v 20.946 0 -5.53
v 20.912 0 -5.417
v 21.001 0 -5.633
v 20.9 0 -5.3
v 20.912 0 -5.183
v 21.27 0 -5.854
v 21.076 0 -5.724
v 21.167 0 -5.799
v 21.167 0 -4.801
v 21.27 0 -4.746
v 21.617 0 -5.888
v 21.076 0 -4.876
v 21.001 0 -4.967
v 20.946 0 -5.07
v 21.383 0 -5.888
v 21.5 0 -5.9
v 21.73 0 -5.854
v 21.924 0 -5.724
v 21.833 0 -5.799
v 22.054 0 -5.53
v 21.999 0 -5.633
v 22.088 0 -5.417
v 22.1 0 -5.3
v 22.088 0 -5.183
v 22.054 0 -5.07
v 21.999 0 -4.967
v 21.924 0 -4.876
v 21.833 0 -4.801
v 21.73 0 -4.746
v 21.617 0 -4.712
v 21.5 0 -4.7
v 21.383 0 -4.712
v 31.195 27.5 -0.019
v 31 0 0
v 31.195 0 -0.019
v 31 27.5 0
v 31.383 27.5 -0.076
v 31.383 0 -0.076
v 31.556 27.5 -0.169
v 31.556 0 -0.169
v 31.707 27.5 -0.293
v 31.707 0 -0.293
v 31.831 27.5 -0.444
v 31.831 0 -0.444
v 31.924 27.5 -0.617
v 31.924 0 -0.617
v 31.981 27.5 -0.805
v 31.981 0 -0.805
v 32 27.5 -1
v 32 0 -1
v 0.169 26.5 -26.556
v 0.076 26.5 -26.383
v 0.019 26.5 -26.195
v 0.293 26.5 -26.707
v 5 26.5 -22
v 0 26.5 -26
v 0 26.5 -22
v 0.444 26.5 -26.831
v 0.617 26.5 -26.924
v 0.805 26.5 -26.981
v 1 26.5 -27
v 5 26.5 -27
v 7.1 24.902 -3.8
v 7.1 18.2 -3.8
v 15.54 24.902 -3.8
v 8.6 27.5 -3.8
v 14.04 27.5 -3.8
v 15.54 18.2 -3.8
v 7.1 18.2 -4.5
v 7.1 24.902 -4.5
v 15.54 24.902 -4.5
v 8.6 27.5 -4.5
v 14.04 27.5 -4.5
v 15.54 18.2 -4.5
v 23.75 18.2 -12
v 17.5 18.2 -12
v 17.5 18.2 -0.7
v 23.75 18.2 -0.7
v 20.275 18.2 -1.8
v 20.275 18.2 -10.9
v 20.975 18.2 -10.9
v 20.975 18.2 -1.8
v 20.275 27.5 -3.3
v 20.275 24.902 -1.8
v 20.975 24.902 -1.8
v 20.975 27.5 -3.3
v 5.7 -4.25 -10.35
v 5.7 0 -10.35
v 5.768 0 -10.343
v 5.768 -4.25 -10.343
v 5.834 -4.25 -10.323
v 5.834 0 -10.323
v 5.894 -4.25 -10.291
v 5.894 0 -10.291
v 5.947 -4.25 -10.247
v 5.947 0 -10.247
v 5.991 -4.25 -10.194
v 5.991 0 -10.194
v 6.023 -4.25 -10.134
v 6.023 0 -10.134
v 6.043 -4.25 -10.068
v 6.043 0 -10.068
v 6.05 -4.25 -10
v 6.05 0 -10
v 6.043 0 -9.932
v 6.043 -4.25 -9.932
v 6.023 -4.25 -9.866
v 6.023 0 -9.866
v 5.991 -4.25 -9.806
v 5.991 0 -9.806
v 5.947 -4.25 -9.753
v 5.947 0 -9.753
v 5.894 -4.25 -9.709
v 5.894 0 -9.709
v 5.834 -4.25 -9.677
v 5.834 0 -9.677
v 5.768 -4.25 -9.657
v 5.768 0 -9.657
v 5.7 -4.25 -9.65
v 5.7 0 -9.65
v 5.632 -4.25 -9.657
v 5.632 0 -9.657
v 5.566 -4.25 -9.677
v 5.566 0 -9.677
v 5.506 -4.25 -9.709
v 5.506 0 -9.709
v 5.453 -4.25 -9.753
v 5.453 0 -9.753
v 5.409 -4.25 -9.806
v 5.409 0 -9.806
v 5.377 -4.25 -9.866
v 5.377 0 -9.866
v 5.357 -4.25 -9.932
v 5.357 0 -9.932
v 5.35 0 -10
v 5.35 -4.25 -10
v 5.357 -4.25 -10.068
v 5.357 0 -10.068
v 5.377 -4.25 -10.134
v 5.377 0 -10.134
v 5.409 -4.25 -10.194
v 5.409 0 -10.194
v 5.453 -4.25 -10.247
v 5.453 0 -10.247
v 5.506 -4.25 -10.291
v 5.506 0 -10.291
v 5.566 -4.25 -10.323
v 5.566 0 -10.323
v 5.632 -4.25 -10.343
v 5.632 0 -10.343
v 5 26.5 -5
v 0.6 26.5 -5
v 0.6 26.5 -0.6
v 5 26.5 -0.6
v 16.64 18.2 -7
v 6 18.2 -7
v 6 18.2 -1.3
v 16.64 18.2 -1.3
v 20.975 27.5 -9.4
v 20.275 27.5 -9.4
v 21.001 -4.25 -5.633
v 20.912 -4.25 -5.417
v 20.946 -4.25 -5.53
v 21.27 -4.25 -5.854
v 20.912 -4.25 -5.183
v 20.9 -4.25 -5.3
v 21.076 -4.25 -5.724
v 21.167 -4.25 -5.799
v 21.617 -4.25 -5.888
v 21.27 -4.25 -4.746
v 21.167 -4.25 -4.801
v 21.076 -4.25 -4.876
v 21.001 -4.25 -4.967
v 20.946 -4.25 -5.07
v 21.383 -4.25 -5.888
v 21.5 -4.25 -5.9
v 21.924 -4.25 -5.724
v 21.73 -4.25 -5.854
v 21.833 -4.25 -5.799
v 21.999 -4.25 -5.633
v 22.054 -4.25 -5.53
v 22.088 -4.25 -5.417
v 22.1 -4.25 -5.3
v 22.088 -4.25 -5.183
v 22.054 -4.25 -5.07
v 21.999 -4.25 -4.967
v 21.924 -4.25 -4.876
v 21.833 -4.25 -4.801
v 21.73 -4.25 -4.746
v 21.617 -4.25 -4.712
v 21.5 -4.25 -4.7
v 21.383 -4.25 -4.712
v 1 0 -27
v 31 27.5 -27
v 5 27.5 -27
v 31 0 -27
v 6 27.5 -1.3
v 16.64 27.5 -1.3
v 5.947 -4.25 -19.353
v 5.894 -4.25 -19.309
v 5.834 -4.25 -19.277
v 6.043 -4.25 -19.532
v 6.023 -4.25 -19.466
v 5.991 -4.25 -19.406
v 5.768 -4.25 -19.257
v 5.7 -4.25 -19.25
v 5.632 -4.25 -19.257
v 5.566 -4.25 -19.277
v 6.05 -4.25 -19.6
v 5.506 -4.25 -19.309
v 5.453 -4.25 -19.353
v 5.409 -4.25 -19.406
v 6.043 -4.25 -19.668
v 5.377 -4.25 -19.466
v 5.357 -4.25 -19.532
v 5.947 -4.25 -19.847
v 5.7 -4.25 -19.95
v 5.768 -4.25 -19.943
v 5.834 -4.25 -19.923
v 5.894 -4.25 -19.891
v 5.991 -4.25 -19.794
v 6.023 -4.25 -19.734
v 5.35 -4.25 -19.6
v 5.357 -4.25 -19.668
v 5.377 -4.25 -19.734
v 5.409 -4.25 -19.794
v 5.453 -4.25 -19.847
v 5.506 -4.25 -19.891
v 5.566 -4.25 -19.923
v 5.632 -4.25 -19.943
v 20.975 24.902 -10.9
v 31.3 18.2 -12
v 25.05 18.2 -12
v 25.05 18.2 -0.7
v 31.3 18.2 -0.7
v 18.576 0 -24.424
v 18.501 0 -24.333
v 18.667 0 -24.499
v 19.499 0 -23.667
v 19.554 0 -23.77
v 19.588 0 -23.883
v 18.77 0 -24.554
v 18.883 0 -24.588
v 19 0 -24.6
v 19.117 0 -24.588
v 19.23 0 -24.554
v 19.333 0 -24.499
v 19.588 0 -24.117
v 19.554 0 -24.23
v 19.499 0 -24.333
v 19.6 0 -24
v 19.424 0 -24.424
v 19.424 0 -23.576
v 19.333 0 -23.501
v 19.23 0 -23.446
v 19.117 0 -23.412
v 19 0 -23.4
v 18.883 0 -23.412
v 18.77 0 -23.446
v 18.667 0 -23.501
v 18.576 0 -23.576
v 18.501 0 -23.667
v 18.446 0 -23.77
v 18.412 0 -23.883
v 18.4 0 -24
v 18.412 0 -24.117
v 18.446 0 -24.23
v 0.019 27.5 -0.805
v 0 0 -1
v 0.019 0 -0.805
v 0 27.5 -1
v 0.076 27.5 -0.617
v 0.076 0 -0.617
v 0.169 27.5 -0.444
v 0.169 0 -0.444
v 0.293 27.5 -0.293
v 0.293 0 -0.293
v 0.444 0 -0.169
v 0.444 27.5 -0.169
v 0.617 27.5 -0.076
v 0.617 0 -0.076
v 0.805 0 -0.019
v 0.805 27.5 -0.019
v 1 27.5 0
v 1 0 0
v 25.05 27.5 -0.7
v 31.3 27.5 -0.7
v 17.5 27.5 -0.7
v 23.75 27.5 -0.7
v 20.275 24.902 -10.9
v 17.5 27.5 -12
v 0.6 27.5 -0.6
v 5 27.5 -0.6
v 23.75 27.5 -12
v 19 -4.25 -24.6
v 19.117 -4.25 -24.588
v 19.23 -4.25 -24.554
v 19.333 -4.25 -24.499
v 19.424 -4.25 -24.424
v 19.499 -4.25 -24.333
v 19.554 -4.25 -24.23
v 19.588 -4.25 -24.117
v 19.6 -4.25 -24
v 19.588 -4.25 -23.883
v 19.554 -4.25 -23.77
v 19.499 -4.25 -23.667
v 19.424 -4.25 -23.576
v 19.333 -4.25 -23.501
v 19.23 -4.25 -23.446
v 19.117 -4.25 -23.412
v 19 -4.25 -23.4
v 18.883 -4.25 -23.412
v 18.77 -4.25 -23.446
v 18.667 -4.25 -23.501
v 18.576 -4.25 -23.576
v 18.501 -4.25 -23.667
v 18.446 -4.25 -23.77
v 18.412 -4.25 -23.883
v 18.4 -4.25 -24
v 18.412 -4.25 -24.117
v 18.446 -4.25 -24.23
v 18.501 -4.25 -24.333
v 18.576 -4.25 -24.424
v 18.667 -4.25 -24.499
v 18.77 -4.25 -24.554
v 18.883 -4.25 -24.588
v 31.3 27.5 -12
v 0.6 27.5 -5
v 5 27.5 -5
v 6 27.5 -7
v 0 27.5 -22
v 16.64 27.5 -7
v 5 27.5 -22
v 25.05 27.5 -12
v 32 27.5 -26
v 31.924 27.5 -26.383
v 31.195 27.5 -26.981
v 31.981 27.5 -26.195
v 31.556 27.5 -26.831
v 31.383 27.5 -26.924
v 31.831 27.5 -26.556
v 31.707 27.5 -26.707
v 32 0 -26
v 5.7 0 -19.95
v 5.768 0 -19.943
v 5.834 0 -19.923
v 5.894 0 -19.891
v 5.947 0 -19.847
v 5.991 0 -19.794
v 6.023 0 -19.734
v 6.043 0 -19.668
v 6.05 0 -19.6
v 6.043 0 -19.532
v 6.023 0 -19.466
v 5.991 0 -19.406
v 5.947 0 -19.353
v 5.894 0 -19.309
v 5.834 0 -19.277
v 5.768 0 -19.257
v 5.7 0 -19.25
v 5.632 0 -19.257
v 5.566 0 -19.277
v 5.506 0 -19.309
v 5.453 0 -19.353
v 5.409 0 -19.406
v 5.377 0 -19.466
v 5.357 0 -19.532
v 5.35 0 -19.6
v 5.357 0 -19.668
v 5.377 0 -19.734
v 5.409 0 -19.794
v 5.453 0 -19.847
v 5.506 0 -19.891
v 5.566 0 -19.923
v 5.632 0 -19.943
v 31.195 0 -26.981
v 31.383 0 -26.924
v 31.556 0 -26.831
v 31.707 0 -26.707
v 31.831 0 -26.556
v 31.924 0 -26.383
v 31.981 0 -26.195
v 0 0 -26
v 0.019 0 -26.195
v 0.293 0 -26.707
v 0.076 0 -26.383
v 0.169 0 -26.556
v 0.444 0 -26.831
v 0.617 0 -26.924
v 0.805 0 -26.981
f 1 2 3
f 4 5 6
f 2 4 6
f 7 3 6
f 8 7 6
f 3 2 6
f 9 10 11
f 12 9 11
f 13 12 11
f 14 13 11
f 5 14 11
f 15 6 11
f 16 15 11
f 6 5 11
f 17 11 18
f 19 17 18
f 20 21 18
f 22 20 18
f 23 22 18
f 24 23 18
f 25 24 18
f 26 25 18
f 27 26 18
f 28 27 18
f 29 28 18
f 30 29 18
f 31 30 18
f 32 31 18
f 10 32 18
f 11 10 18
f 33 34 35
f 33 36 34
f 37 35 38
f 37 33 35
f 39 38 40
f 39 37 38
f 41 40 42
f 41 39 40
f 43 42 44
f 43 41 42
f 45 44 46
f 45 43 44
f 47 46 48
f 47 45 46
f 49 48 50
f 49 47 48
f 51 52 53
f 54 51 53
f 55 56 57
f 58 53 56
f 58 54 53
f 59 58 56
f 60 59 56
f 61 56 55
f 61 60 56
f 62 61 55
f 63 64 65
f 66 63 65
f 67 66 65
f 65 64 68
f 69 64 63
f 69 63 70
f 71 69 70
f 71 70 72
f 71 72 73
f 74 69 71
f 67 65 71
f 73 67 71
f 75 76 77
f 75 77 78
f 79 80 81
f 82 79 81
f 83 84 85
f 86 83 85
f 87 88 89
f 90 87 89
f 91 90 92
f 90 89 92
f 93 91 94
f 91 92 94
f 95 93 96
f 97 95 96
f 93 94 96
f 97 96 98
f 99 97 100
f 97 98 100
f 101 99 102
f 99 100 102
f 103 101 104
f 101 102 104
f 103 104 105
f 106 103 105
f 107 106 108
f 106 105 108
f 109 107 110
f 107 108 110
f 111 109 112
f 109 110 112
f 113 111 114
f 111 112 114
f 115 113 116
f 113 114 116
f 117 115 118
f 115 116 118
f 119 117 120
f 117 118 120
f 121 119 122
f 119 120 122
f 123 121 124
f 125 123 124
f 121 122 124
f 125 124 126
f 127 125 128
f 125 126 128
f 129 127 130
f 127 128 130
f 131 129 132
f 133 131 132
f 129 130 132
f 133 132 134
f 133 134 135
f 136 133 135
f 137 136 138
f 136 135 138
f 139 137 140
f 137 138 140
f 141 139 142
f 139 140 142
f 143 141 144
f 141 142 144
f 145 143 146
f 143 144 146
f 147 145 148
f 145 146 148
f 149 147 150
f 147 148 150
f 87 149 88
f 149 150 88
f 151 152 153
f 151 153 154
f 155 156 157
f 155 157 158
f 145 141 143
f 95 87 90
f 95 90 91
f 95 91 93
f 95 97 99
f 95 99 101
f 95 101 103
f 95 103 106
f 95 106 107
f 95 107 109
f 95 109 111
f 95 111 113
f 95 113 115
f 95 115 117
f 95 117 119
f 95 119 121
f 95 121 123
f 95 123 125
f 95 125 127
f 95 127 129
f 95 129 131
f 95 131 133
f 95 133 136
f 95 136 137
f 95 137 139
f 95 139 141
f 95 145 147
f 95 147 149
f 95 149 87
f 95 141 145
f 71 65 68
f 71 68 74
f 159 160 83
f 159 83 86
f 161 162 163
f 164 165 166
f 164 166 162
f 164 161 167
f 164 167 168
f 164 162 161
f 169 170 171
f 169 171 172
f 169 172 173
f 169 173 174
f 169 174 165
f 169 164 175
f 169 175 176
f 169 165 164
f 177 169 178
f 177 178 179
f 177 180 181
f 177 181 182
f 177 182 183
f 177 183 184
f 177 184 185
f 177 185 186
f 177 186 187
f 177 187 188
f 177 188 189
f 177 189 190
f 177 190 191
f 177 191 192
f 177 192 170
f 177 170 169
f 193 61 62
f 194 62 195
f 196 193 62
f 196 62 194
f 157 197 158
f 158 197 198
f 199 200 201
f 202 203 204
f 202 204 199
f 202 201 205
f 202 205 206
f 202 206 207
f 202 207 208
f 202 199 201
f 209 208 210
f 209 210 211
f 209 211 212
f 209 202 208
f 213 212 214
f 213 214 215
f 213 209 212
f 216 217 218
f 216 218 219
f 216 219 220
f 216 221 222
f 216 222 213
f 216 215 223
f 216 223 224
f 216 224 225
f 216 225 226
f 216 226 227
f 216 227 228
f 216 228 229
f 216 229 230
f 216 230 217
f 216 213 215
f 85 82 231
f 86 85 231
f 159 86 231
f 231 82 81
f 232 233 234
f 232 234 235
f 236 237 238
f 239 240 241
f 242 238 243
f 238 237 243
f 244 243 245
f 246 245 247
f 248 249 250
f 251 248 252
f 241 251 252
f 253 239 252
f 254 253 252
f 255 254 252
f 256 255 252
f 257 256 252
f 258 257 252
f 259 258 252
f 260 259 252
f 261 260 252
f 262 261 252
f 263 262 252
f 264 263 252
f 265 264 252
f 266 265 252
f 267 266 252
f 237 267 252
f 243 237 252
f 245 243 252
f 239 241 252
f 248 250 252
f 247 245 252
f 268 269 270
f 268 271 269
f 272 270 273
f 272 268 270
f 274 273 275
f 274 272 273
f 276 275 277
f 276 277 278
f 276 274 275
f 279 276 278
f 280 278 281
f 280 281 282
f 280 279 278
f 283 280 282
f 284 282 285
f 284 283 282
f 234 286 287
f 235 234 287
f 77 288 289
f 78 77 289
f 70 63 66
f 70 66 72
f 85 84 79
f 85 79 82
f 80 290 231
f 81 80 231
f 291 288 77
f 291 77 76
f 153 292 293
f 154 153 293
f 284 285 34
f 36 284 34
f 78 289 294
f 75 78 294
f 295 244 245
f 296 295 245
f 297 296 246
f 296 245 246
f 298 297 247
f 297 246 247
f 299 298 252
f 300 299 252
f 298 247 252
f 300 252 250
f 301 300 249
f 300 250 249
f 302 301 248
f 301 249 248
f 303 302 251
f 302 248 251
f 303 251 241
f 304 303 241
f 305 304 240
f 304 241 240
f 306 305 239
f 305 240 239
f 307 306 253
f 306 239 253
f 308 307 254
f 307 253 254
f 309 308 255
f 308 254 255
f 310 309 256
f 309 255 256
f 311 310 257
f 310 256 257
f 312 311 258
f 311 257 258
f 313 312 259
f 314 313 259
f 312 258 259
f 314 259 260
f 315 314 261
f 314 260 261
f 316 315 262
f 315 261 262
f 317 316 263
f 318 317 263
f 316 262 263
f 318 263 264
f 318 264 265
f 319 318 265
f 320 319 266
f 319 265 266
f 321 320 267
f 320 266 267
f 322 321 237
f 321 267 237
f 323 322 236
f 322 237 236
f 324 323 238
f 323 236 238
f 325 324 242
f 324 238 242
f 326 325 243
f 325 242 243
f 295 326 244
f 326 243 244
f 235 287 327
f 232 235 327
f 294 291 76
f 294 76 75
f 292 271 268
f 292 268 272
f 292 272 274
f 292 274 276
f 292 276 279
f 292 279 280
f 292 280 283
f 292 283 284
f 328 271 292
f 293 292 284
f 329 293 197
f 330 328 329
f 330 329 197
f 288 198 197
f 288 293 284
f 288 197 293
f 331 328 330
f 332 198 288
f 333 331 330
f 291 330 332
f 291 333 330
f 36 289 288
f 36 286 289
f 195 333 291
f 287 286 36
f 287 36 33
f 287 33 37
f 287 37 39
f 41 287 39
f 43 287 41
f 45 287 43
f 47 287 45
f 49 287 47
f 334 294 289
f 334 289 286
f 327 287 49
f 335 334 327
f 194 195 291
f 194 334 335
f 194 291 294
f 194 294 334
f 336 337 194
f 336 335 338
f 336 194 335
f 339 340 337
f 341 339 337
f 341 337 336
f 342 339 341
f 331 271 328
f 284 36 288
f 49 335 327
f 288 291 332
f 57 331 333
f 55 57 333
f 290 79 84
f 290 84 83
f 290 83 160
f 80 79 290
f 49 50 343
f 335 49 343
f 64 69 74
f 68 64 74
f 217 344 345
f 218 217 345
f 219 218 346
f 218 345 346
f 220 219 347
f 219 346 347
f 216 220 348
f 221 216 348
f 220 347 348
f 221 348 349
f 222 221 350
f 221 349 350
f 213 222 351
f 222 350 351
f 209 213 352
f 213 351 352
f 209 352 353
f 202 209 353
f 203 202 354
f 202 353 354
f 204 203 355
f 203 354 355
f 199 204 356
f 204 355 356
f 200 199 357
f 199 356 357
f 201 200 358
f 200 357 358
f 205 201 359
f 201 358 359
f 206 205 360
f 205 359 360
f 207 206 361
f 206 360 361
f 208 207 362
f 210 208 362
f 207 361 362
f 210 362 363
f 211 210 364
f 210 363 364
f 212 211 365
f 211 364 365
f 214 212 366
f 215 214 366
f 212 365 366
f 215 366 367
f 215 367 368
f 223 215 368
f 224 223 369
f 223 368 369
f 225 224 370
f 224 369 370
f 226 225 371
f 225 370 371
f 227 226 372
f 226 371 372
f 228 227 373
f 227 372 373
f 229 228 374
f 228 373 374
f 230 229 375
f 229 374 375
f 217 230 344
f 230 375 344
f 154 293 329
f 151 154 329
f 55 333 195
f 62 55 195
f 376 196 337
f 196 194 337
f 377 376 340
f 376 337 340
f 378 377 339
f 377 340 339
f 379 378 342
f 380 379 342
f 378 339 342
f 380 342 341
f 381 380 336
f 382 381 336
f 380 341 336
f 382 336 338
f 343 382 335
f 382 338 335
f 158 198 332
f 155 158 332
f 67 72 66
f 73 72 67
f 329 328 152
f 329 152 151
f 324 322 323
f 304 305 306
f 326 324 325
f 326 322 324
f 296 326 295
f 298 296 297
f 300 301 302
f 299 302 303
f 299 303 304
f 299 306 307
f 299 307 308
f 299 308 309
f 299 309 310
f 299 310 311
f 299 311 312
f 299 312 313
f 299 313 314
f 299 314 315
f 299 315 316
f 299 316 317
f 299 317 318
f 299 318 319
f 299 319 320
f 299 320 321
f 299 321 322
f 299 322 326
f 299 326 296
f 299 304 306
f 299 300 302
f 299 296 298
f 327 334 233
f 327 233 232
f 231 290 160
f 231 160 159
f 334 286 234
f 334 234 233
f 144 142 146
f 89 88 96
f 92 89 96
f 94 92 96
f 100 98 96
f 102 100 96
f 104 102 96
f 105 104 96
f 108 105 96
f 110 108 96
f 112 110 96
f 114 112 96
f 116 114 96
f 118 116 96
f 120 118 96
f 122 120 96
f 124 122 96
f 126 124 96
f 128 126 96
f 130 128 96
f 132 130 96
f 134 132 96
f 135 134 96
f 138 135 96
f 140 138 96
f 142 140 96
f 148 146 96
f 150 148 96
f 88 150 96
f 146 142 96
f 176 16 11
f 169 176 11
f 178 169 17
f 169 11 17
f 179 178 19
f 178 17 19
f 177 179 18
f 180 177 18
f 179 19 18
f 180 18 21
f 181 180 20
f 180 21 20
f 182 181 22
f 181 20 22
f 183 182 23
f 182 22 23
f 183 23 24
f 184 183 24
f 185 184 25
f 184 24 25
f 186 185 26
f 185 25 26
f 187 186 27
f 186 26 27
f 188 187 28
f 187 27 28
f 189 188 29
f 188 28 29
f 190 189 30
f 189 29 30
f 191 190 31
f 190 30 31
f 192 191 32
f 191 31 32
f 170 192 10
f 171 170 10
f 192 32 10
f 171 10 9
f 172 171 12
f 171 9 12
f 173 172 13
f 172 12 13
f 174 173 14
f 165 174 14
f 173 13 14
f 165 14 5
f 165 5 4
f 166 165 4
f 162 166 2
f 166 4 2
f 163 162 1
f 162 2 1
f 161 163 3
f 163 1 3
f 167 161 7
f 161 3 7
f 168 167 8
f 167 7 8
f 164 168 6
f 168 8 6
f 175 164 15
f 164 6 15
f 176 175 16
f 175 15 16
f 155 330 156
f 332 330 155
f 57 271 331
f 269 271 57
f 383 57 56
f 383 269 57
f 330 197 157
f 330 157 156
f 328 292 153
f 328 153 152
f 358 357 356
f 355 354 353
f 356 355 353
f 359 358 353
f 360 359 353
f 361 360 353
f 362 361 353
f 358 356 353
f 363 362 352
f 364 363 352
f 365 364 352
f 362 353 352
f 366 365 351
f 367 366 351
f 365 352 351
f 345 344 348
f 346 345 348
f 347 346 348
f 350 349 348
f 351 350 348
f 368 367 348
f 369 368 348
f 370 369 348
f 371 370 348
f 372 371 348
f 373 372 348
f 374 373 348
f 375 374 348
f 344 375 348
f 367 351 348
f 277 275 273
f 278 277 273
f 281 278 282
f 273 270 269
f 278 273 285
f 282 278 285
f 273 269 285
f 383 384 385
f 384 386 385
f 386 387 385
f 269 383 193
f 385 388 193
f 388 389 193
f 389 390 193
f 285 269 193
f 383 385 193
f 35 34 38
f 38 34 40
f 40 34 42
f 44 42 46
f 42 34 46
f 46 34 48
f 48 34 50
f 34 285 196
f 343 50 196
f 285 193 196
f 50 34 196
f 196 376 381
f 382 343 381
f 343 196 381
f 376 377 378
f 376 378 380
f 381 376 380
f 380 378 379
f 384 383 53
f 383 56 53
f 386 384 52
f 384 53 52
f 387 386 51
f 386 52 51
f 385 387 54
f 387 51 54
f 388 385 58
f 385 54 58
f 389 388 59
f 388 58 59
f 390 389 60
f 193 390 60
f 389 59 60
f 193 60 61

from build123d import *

# Parameters (mm, degrees)
SKETCH1_W             = 32
SKETCH1_H             = 27
BOSS_EXTRUDE1_DEPTH   = 27.5
SKETCH2_W             = 10.64
SKETCH2_H             = 5.7
SKETCH2_W_2           = 6.25
SKETCH2_H_2           = 11.3
CUT_EXTRUDE1_DEPTH    = 9.3
SKETCH3_W             = 4.4
SKETCH3_H             = 4.4
SKETCH3_W_2           = 5
SKETCH3_H_2           = 5
CUT_EXTRUDE2_DEPTH    = 1
SKETCH4_W             = 8.44
SKETCH4_H             = 0.7
BOSS_EXTRUDE2_DEPTH   = 9.3
SKETCH4_W_2           = 0.7
SKETCH4_H_2           = 9.1
BOSS_EXTRUDE2_2_DEPTH = 9.3
CHAMFER1_SIZE         = 1.5
CHAMFER1_SIZE2        = 2.598076211
CHAMFER2_SIZE         = 1.5
CHAMFER2_SIZE2        = 2.598076211
FILLET1_R             = 1
SKETCH5_R             = 0.35
BOSS_EXTRUDE3_DEPTH   = 4.25
BOSS_EXTRUDE3_2_DEPTH = 4.25
SKETCH5_R_2           = 0.6
BOSS_EXTRUDE3_3_DEPTH = 4.25
BOSS_EXTRUDE3_4_DEPTH = 4.25


with BuildPart() as part:
    # Sketch1 → Boss-Extrude1 (new body)
    with BuildSketch(Plane(origin=(0, 0, 0), x_dir=(1, 0, 0), z_dir=(0, 1, 0))):
        with Locations((16, 13.5)):
            Rectangle(SKETCH1_W, SKETCH1_H)
    extrude(amount=BOSS_EXTRUDE1_DEPTH)

    # Sketch2 → Cut-Extrude1 (cut)
    with BuildSketch(Plane(origin=(0, 27.5, 0), x_dir=(1, 0, 0), z_dir=(0, 1, 0))):
        with Locations((11.32, 4.15)):
            Rectangle(SKETCH2_W, SKETCH2_H)
        with Locations((20.625, 6.35)):
            Rectangle(SKETCH2_W_2, SKETCH2_H_2)
        with Locations((28.175, 6.35)):
            Rectangle(SKETCH2_W_2, SKETCH2_H_2)
    extrude(amount=-CUT_EXTRUDE1_DEPTH, mode=Mode.SUBTRACT)

    # Sketch3 → Cut-Extrude2 (cut)
    with BuildSketch(Plane(origin=(0, 27.5, 0), x_dir=(1, 0, 0), z_dir=(0, 1, 0))):
        with Locations((2.8, 2.8)):
            Rectangle(SKETCH3_W, SKETCH3_H)
        with Locations((2.5, 24.5)):
            Rectangle(SKETCH3_W_2, SKETCH3_H_2)
    extrude(amount=-CUT_EXTRUDE2_DEPTH, mode=Mode.SUBTRACT)

    # Fillet1
    fillet1_edges = [part.edges().sort_by_distance(p)[0] for p in [
        (0, 13.25, -27),
        (32, 13.75, -27),
        (32, 13.75, 0),
        (0, 13.75, 0),
    ]]
    fillet(fillet1_edges, radius=FILLET1_R)


with BuildPart() as body_2:
    # Sketch4 → Boss-Extrude2 (new body)
    with BuildSketch(Plane(origin=(0, 18.2, 0), x_dir=(1, 0, 0), z_dir=(0, 1, 0))):
        with Locations((11.32, 4.15)):
            Rectangle(SKETCH4_W, SKETCH4_H)
    extrude(amount=BOSS_EXTRUDE2_DEPTH)

    # Chamfer1
    chamfer1_edges = [body_2.edges().sort_by_distance(p)[0] for p in [
        (15.54, 27.5, -4.15),
        (7.1, 27.5, -4.15),
    ]]
    chamfer1_side = [body_2.faces().sort_by_distance(p)[0] for p in [
        (11.32, 27.5, -4.15),
    ]]
    chamfer(chamfer1_edges, length=CHAMFER1_SIZE, length2=CHAMFER1_SIZE2, reference=chamfer1_side[0])


with BuildPart() as body_3:
    # Sketch4 → Boss-Extrude2 2 (new body)
    with BuildSketch(Plane(origin=(0, 18.2, 0), x_dir=(1, 0, 0), z_dir=(0, 1, 0))):
        with Locations((20.625, 6.35)):
            Rectangle(SKETCH4_W_2, SKETCH4_H_2)
    extrude(amount=BOSS_EXTRUDE2_2_DEPTH)

    # Chamfer2
    chamfer2_edges = [body_3.edges().sort_by_distance(p)[0] for p in [
        (20.625, 27.5, -10.9),
        (20.625, 27.5, -1.8),
    ]]
    chamfer2_side = [body_3.faces().sort_by_distance(p)[0] for p in [
        (20.625, 27.5, -6.35),
    ]]
    chamfer(chamfer2_edges, length=CHAMFER2_SIZE, length2=CHAMFER2_SIZE2, reference=chamfer2_side[0])


with BuildPart() as body_4:
    # Sketch5 → Boss-Extrude3 (new body)
    with BuildSketch(Plane.XZ):
        with Locations(Location((5.7, -19.6, 0), (0, 0, 270))):
            Circle(SKETCH5_R)
    extrude(amount=BOSS_EXTRUDE3_DEPTH)


with BuildPart() as body_5:
    # Sketch5 → Boss-Extrude3 2 (new body)
    with BuildSketch(Plane.XZ):
        with Locations(Location((5.7, -10, 0), (0, 0, 270))):
            Circle(SKETCH5_R)
    extrude(amount=BOSS_EXTRUDE3_2_DEPTH)


with BuildPart() as body_6:
    # Sketch5 → Boss-Extrude3 3 (new body)
    with BuildSketch(Plane.XZ):
        with Locations(Location((19, -24, 0), (0, 0, 270))):
            Circle(SKETCH5_R_2)
    extrude(amount=BOSS_EXTRUDE3_3_DEPTH)


with BuildPart() as body_7:
    # Sketch5 → Boss-Extrude3 4 (new body)
    with BuildSketch(Plane.XZ):
        with Locations(Location((21.5, -5.3, 0), (0, 0, 270))):
            Circle(SKETCH5_R_2)
    extrude(amount=BOSS_EXTRUDE3_4_DEPTH)


solid = Compound([part.part, body_2.part, body_3.part, body_4.part, body_5.part, body_6.part, body_7.part])
